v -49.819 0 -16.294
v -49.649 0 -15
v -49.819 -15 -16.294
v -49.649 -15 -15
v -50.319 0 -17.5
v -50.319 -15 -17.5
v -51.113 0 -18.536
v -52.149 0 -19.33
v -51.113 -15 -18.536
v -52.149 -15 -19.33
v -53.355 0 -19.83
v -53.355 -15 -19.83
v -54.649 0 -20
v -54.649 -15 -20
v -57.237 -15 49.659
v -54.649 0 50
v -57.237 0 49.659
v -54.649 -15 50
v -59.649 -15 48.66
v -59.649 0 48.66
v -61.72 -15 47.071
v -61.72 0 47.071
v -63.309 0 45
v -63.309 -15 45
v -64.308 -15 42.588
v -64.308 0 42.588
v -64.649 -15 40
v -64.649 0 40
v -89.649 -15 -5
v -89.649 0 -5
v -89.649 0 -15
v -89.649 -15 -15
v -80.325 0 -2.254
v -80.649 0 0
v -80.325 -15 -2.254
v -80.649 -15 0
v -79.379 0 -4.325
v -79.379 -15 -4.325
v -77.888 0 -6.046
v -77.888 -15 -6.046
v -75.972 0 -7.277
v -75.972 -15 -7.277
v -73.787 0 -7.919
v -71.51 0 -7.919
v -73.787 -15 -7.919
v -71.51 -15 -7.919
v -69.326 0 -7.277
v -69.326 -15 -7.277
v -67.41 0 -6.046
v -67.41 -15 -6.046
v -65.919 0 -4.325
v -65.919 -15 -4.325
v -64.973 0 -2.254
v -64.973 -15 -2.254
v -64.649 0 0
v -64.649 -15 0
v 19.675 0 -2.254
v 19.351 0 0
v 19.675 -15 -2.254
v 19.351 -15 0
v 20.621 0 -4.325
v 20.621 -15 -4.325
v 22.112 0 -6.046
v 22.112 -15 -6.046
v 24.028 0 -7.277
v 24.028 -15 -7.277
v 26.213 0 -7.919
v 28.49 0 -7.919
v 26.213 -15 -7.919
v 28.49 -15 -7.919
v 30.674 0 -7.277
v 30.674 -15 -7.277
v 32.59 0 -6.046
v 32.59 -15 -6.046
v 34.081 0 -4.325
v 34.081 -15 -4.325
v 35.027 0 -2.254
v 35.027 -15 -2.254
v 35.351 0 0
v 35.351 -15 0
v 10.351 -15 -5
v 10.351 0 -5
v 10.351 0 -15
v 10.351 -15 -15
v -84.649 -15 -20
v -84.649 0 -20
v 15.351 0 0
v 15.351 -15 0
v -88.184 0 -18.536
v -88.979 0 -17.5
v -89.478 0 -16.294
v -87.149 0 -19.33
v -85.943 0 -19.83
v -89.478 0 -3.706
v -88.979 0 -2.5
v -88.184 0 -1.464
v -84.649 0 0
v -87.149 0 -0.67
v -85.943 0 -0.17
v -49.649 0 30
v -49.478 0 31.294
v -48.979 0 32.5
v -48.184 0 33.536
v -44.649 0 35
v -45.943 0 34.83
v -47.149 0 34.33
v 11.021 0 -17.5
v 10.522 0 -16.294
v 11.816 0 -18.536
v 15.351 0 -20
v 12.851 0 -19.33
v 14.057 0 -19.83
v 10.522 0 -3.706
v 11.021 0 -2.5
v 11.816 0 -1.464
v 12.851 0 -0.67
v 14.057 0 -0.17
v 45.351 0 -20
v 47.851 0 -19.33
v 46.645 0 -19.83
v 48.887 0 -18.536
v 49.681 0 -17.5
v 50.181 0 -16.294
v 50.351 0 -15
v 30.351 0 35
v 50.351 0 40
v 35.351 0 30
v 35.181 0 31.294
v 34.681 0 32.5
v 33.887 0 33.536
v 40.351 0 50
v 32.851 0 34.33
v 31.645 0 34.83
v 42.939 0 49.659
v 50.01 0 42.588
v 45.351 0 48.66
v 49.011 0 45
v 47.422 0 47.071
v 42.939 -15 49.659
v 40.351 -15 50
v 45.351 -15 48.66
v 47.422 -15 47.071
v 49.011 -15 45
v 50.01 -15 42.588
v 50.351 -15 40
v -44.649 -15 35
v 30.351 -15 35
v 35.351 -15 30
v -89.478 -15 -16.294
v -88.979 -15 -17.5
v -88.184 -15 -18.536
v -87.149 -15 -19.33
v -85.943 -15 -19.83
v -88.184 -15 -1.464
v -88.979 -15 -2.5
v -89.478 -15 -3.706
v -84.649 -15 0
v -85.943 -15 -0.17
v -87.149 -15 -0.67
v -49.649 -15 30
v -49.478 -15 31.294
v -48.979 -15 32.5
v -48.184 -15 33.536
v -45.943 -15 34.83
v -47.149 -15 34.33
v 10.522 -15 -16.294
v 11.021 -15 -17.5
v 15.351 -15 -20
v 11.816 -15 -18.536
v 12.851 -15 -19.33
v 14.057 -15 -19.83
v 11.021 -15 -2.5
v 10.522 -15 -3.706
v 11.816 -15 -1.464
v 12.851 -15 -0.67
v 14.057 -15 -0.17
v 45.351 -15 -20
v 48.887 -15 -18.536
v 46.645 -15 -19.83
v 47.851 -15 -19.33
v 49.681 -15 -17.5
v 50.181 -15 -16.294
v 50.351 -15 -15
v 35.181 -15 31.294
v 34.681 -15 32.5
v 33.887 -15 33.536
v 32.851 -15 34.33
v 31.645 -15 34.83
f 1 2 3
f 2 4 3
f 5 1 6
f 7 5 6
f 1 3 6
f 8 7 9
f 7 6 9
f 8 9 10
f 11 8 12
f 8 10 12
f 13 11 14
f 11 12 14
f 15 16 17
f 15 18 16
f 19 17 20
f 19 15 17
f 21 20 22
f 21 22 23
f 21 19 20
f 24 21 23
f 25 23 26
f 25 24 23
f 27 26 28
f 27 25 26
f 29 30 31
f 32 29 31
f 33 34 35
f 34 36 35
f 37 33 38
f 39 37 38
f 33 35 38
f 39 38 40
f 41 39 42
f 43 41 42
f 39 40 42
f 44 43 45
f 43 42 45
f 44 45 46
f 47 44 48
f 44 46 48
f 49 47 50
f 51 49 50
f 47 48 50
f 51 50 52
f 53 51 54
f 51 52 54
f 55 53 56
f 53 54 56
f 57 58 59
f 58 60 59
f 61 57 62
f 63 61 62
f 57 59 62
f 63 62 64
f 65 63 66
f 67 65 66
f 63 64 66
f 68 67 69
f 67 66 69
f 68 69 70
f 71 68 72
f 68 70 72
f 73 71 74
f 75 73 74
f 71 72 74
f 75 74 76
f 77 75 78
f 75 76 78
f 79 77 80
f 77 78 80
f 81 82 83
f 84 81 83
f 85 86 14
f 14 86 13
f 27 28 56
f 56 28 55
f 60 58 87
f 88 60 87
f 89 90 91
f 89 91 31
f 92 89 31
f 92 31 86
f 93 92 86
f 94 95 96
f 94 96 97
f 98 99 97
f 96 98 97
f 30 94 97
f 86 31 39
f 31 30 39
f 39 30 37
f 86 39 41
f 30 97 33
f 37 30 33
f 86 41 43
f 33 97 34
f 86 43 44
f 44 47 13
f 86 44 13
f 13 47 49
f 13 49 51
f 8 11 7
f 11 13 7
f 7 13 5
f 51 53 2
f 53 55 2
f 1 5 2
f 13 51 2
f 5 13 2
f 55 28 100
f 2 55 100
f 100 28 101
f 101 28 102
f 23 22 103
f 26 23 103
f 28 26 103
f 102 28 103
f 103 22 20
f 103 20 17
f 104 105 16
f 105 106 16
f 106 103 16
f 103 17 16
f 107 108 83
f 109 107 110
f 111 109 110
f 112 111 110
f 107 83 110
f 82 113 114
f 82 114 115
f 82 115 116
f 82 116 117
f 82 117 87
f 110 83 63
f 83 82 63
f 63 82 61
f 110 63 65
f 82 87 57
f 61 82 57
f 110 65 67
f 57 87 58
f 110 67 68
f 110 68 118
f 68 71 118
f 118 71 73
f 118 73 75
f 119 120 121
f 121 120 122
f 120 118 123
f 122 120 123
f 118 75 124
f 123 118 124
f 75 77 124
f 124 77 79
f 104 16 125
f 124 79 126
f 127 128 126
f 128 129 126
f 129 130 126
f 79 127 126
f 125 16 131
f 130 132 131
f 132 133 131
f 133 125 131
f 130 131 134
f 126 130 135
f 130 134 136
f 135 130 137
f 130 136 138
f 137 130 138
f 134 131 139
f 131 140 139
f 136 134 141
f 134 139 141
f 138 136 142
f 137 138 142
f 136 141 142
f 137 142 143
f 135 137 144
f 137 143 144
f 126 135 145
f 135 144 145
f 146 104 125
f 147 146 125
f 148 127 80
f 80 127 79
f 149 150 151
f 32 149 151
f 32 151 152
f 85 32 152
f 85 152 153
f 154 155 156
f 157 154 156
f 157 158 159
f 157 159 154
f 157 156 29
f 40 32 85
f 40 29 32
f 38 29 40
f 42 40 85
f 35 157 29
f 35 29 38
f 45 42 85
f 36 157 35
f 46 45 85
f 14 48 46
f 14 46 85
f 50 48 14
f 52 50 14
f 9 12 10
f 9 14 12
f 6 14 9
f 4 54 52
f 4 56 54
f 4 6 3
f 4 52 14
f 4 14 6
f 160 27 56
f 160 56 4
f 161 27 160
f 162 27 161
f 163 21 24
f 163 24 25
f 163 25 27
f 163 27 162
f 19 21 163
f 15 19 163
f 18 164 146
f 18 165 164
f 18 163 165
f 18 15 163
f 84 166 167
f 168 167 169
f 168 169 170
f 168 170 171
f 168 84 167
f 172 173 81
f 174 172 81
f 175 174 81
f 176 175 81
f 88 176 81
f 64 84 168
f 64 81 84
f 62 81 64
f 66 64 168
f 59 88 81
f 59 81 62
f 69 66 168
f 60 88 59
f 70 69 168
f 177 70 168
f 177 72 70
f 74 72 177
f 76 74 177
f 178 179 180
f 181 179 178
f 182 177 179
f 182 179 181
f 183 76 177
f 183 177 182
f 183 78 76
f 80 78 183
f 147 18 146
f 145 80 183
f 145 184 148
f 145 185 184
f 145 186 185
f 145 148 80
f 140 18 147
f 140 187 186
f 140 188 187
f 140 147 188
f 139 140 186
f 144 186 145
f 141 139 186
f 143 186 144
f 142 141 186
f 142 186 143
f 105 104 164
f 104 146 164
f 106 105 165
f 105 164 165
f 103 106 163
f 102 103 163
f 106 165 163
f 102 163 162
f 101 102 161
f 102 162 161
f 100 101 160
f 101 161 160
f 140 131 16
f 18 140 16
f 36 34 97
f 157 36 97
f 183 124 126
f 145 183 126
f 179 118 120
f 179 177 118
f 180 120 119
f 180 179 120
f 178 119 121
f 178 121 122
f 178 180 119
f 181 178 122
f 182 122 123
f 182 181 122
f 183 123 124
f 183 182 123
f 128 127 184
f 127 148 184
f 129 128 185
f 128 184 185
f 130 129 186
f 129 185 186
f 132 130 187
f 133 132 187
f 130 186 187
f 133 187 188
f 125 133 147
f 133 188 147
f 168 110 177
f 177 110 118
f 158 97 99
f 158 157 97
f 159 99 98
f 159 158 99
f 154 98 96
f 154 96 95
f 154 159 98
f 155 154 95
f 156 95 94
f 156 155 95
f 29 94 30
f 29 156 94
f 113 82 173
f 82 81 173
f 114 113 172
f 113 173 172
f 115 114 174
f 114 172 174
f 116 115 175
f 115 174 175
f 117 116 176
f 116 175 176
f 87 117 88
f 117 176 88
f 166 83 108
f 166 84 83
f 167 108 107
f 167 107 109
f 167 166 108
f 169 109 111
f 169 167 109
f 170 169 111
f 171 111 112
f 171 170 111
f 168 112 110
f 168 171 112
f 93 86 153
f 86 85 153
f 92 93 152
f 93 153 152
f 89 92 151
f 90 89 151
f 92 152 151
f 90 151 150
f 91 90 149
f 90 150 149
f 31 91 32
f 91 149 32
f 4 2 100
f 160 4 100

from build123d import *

# Parameters (mm, degrees)
F1_DEPTH = 15
F2_R     = 8
F3_DEPTH = 15.001
F4_R     = 10
F5_R     = 5
F6_R     = 5
F7_R     = 5


with BuildPart() as f1:
    # F0 (on Front) → F1 (new body)
    with BuildSketch(Plane.XZ):
        Polygon((50.351163, 50), (-64.648837, 50), (-64.648837, 0), (-89.648837, 0), (-89.648837, -20), (-49.648837, -20), (-49.648837, 35), (35.351163, 35), (35.351163, 0), (10.351163, 0), (10.351163, -20), (50.351163, -20), align=None)
    extrude(amount=F1_DEPTH)

    # F2 (on face) → F3 (cut, through all)
    with BuildSketch(Plane.XZ.offset(15)):
        with Locations((-72.648837, 0)):
            Circle(F2_R)
        with Locations((27.351163, 0)):
            Circle(F2_R)
    extrude(amount=-F3_DEPTH, mode=Mode.SUBTRACT)

    # F4
    f4_edges = [f1.edges().sort_by_distance(p)[0] for p in [
        (-64.648837, -7.5, 50),
        (50.351163, -7.5, 50),
    ]]
    fillet(f4_edges, radius=F4_R)

    # F5
    f5_edges = [f1.edges().sort_by_distance(p)[0] for p in [
        (-89.648837, -7.5, 0),
        (10.351163, -7.5, 0),
        (-49.648837, -7.5, 35),
        (35.351163, -7.5, 35),
    ]]
    fillet(f5_edges, radius=F5_R)

    # F6
    f6_edges = [f1.edges().sort_by_distance(p)[0] for p in [
        (-89.648837, -7.5, -20),
        (10.351163, -7.5, -20),
    ]]
    fillet(f6_edges, radius=F6_R)

    # F7
    f7_edges = [f1.edges().sort_by_distance(p)[0] for p in [
        (-49.648837, -7.5, -20),
        (50.351163, -7.5, -20),
    ]]
    fillet(f7_edges, radius=F7_R)


solid = f1.part
